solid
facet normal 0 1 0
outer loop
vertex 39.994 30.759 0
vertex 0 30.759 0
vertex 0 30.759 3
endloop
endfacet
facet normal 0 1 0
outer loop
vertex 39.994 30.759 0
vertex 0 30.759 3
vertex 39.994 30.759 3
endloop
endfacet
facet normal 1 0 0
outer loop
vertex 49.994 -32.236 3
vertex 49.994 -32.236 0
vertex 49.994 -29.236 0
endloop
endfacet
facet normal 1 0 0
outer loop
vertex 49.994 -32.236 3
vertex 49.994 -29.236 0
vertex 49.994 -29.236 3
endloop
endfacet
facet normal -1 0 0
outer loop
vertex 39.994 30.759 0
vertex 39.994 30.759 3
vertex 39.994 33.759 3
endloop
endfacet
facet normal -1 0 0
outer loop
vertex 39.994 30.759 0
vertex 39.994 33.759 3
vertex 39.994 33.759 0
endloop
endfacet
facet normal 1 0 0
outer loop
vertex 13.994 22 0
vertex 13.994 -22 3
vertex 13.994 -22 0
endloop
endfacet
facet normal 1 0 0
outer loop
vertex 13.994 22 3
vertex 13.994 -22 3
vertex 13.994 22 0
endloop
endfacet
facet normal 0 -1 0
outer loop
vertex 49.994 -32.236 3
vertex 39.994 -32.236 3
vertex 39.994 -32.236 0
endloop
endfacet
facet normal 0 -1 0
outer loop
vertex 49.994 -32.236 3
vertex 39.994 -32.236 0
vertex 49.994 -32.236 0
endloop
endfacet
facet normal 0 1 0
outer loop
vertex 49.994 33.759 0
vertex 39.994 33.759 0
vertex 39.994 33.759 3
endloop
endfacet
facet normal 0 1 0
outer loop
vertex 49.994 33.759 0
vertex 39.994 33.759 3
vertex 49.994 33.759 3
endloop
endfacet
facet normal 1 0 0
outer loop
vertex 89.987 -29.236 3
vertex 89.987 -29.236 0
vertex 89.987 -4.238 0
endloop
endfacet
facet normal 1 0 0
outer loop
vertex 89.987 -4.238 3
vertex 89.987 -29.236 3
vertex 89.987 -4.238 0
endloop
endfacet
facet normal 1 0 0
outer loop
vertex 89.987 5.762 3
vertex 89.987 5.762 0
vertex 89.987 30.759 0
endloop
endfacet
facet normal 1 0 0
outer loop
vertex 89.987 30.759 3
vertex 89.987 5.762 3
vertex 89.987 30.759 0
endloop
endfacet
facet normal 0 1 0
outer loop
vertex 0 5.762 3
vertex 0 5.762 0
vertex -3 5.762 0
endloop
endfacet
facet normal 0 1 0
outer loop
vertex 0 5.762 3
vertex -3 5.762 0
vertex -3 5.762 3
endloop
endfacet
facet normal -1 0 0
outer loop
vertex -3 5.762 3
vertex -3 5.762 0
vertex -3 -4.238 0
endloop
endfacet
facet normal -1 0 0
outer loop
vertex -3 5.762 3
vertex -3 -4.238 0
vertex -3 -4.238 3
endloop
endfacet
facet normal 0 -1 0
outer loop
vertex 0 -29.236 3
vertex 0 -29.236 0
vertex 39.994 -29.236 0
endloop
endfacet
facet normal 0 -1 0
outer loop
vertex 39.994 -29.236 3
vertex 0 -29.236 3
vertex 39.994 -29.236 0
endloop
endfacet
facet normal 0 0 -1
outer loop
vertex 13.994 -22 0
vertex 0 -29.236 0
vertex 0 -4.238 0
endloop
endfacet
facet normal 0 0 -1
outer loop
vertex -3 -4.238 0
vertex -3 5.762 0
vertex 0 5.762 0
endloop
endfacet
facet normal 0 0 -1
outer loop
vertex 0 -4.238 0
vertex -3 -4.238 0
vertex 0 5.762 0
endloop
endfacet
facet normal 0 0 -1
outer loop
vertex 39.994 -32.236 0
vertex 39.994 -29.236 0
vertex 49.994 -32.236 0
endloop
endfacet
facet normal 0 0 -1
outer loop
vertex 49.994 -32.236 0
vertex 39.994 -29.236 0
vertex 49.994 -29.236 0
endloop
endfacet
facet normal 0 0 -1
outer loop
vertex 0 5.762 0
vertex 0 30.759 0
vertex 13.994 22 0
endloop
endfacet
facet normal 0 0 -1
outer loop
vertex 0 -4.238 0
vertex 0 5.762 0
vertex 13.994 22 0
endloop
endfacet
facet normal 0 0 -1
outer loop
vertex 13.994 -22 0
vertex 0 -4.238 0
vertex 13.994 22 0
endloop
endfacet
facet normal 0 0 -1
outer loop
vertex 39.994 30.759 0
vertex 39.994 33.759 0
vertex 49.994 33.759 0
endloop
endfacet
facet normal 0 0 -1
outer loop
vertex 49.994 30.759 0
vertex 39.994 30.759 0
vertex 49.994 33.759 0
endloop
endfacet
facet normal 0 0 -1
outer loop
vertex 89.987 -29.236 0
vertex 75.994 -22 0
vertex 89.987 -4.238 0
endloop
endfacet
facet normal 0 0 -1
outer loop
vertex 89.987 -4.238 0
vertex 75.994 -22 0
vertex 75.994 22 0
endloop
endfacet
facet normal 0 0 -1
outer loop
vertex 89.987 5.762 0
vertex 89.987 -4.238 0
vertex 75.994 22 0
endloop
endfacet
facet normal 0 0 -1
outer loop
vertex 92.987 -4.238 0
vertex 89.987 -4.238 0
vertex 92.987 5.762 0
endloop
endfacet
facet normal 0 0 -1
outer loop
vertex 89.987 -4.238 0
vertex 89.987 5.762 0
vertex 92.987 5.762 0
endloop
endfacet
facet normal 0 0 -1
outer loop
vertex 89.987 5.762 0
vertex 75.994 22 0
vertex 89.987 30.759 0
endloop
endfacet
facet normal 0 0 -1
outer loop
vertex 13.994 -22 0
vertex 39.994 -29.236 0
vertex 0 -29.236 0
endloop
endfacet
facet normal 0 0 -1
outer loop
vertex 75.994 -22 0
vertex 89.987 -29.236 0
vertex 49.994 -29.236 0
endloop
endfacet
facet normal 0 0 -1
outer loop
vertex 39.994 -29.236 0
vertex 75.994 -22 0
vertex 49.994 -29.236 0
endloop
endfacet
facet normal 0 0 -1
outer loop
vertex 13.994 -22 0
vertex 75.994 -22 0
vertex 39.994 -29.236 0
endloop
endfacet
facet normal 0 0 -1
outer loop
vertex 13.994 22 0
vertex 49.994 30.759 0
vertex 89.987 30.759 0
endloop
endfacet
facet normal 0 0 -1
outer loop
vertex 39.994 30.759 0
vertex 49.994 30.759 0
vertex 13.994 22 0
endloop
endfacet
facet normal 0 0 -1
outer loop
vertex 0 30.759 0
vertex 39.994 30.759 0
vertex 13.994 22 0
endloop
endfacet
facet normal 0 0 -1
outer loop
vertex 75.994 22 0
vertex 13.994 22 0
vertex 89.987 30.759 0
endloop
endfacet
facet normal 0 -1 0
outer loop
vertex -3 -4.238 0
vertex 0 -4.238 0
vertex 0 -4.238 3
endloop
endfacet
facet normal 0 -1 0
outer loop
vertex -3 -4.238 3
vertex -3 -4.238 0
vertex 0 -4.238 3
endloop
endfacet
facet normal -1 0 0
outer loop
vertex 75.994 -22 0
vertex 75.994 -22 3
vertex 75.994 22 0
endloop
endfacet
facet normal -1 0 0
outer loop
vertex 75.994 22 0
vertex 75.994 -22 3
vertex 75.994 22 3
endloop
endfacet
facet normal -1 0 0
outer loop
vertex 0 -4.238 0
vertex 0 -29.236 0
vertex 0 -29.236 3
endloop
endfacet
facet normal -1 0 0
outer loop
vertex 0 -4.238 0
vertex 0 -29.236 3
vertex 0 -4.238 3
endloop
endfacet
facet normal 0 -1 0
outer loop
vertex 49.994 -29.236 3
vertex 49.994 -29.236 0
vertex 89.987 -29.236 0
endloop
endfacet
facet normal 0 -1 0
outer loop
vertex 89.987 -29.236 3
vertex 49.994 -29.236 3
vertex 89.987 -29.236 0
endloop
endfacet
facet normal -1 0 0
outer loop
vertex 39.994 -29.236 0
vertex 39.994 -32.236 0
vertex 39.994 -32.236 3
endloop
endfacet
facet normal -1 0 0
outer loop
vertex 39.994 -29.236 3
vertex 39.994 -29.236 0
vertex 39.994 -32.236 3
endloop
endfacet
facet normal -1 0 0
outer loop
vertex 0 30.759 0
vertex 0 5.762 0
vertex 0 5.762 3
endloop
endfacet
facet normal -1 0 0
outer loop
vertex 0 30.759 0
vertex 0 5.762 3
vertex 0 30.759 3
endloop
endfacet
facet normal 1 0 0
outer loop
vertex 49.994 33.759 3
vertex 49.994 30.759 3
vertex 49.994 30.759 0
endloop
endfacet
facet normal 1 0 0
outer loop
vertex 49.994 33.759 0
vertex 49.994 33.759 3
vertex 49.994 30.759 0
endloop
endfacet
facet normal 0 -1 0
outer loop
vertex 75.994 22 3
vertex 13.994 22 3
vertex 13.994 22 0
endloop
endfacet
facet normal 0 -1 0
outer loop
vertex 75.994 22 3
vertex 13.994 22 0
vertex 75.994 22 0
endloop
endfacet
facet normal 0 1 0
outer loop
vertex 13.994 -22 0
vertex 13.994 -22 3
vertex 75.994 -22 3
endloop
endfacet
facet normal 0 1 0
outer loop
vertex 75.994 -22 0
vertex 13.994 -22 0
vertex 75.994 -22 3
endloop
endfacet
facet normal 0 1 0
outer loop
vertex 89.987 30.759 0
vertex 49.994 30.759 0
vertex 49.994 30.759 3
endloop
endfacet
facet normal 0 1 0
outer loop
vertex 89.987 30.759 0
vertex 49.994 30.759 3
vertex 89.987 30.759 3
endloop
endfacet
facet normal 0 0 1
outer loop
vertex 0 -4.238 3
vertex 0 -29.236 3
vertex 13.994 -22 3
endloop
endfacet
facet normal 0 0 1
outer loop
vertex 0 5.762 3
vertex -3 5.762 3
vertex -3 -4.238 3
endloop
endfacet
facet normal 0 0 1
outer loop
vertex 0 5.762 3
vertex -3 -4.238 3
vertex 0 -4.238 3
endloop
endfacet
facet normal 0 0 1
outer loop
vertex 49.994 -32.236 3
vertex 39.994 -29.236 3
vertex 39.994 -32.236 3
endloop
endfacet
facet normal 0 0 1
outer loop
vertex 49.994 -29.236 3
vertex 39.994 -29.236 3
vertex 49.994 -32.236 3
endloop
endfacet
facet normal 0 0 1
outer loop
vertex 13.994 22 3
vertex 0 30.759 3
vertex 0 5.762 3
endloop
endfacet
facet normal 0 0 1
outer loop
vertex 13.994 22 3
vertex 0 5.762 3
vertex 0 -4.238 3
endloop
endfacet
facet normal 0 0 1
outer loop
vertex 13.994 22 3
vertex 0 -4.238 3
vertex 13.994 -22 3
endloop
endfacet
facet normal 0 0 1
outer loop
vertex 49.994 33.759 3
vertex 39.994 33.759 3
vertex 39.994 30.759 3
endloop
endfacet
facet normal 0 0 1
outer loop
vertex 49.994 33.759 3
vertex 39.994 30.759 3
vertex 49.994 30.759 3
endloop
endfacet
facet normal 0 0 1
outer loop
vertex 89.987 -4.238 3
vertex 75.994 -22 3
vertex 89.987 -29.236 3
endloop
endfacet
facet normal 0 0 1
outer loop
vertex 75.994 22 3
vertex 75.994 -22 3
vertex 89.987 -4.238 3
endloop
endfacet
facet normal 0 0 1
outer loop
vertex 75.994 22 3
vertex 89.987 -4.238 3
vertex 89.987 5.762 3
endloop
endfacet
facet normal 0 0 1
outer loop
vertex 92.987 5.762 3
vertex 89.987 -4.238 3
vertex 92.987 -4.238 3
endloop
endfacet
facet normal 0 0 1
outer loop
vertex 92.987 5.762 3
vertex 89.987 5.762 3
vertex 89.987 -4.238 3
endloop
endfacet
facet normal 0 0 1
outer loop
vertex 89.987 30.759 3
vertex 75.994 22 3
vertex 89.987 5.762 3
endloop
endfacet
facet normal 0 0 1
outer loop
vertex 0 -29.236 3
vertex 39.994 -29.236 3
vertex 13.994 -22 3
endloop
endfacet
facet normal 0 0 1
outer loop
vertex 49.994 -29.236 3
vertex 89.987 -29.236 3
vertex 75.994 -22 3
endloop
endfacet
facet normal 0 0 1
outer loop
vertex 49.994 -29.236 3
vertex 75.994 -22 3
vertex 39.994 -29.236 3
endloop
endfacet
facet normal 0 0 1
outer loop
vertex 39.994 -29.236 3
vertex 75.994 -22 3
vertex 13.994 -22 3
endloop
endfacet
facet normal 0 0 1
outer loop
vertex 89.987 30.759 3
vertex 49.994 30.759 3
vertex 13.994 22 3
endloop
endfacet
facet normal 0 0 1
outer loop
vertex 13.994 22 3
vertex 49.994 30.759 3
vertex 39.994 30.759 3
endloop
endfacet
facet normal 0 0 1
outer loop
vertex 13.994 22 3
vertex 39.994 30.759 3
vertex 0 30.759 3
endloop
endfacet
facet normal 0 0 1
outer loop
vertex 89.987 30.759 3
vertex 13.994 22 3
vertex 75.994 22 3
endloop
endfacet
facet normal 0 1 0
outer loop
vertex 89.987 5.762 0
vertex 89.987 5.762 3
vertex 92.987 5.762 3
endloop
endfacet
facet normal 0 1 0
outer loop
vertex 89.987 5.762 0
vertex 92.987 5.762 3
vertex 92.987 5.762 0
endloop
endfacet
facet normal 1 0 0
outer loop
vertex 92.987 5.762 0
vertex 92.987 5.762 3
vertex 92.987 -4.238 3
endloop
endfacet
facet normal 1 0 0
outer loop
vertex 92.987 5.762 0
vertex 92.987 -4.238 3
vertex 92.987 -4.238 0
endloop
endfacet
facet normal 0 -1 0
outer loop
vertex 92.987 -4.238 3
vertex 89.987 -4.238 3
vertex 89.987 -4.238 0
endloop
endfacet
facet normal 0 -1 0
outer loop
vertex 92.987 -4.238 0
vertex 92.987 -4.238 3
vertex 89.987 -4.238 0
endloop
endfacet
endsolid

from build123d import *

# Parameters (mm, degrees)
CROQUIS1_W              = 89.98703429
CROQUIS1_H              = 59.995678097
SALIENTE_EXTRUIR1_DEPTH = 3
CROQUIS2_W              = 62
CROQUIS2_H              = 44
CORTAR_EXTRUIR1_DEPTH   = 3
CROQUIS3_W              = 5
CROQUIS3_H              = 3
SALIENTE_EXTRUIR2_DEPTH = 3
CROQUIS4_W              = 5
CROQUIS4_H              = 3
SALIENTE_EXTRUIR3_DEPTH = 3
CROQUIS5_W              = 3
CROQUIS5_H              = 5
SALIENTE_EXTRUIR4_DEPTH = 3
CROQUIS6_W              = 3
CROQUIS6_H              = 5
SALIENTE_EXTRUIR5_DEPTH = 3


with BuildPart() as part:
    # Croquis1 → Saliente-Extruir1 (new body)
    with BuildSketch(Plane.XY):
        with Locations((44.993517145, 0.761655066)):
            Rectangle(CROQUIS1_W, CROQUIS1_H)
    extrude(amount=SALIENTE_EXTRUIR1_DEPTH)

    # Croquis2 → Cortar-Extruir1 (cut)
    with BuildSketch(Plane.XY.offset(3)):
        with Locations((44.993517145, 0)):
            Rectangle(CROQUIS2_W, CROQUIS2_H)
    extrude(amount=-CORTAR_EXTRUIR1_DEPTH, mode=Mode.SUBTRACT)

    # Croquis3 → Saliente-Extruir2 (add)
    with BuildSketch(Plane(origin=(0, 30.759494114, 0), x_dir=(1, 0, 0), z_dir=(0, 1, 0))):
        with Locations((47.493517145, -1.5)):
            Rectangle(CROQUIS3_W, CROQUIS3_H)
        with Locations((42.493517145, -1.5)):
            Rectangle(CROQUIS3_W, CROQUIS3_H)
    extrude(amount=SALIENTE_EXTRUIR2_DEPTH)

    # Croquis4 → Saliente-Extruir3 (add)
    with BuildSketch(Plane.XZ.offset(29.236183983)):
        with Locations((47.493517145, 1.5)):
            Rectangle(CROQUIS4_W, CROQUIS4_H)
        with Locations((42.493517145, 1.5)):
            Rectangle(CROQUIS4_W, CROQUIS4_H)
    extrude(amount=SALIENTE_EXTRUIR3_DEPTH)

    # Croquis5 → Saliente-Extruir4 (add)
    with BuildSketch(Plane(origin=(89.98703429, 0, 0), x_dir=(0, 0, -1), z_dir=(1, 0, 0))):
        with Locations((-1.5, 3.261655066)):
            Rectangle(CROQUIS5_W, CROQUIS5_H)
        with Locations((-1.5, -1.738344934)):
            Rectangle(CROQUIS5_W, CROQUIS5_H)
    extrude(amount=SALIENTE_EXTRUIR4_DEPTH)

    # Croquis6 → Saliente-Extruir5 (add)
    with BuildSketch(Plane.ZY):
        with Locations((1.5, 3.261655066)):
            Rectangle(CROQUIS6_W, CROQUIS6_H)
        with Locations((1.5, -1.738344934)):
            Rectangle(CROQUIS6_W, CROQUIS6_H)
    extrude(amount=SALIENTE_EXTRUIR5_DEPTH)


solid = part.part
